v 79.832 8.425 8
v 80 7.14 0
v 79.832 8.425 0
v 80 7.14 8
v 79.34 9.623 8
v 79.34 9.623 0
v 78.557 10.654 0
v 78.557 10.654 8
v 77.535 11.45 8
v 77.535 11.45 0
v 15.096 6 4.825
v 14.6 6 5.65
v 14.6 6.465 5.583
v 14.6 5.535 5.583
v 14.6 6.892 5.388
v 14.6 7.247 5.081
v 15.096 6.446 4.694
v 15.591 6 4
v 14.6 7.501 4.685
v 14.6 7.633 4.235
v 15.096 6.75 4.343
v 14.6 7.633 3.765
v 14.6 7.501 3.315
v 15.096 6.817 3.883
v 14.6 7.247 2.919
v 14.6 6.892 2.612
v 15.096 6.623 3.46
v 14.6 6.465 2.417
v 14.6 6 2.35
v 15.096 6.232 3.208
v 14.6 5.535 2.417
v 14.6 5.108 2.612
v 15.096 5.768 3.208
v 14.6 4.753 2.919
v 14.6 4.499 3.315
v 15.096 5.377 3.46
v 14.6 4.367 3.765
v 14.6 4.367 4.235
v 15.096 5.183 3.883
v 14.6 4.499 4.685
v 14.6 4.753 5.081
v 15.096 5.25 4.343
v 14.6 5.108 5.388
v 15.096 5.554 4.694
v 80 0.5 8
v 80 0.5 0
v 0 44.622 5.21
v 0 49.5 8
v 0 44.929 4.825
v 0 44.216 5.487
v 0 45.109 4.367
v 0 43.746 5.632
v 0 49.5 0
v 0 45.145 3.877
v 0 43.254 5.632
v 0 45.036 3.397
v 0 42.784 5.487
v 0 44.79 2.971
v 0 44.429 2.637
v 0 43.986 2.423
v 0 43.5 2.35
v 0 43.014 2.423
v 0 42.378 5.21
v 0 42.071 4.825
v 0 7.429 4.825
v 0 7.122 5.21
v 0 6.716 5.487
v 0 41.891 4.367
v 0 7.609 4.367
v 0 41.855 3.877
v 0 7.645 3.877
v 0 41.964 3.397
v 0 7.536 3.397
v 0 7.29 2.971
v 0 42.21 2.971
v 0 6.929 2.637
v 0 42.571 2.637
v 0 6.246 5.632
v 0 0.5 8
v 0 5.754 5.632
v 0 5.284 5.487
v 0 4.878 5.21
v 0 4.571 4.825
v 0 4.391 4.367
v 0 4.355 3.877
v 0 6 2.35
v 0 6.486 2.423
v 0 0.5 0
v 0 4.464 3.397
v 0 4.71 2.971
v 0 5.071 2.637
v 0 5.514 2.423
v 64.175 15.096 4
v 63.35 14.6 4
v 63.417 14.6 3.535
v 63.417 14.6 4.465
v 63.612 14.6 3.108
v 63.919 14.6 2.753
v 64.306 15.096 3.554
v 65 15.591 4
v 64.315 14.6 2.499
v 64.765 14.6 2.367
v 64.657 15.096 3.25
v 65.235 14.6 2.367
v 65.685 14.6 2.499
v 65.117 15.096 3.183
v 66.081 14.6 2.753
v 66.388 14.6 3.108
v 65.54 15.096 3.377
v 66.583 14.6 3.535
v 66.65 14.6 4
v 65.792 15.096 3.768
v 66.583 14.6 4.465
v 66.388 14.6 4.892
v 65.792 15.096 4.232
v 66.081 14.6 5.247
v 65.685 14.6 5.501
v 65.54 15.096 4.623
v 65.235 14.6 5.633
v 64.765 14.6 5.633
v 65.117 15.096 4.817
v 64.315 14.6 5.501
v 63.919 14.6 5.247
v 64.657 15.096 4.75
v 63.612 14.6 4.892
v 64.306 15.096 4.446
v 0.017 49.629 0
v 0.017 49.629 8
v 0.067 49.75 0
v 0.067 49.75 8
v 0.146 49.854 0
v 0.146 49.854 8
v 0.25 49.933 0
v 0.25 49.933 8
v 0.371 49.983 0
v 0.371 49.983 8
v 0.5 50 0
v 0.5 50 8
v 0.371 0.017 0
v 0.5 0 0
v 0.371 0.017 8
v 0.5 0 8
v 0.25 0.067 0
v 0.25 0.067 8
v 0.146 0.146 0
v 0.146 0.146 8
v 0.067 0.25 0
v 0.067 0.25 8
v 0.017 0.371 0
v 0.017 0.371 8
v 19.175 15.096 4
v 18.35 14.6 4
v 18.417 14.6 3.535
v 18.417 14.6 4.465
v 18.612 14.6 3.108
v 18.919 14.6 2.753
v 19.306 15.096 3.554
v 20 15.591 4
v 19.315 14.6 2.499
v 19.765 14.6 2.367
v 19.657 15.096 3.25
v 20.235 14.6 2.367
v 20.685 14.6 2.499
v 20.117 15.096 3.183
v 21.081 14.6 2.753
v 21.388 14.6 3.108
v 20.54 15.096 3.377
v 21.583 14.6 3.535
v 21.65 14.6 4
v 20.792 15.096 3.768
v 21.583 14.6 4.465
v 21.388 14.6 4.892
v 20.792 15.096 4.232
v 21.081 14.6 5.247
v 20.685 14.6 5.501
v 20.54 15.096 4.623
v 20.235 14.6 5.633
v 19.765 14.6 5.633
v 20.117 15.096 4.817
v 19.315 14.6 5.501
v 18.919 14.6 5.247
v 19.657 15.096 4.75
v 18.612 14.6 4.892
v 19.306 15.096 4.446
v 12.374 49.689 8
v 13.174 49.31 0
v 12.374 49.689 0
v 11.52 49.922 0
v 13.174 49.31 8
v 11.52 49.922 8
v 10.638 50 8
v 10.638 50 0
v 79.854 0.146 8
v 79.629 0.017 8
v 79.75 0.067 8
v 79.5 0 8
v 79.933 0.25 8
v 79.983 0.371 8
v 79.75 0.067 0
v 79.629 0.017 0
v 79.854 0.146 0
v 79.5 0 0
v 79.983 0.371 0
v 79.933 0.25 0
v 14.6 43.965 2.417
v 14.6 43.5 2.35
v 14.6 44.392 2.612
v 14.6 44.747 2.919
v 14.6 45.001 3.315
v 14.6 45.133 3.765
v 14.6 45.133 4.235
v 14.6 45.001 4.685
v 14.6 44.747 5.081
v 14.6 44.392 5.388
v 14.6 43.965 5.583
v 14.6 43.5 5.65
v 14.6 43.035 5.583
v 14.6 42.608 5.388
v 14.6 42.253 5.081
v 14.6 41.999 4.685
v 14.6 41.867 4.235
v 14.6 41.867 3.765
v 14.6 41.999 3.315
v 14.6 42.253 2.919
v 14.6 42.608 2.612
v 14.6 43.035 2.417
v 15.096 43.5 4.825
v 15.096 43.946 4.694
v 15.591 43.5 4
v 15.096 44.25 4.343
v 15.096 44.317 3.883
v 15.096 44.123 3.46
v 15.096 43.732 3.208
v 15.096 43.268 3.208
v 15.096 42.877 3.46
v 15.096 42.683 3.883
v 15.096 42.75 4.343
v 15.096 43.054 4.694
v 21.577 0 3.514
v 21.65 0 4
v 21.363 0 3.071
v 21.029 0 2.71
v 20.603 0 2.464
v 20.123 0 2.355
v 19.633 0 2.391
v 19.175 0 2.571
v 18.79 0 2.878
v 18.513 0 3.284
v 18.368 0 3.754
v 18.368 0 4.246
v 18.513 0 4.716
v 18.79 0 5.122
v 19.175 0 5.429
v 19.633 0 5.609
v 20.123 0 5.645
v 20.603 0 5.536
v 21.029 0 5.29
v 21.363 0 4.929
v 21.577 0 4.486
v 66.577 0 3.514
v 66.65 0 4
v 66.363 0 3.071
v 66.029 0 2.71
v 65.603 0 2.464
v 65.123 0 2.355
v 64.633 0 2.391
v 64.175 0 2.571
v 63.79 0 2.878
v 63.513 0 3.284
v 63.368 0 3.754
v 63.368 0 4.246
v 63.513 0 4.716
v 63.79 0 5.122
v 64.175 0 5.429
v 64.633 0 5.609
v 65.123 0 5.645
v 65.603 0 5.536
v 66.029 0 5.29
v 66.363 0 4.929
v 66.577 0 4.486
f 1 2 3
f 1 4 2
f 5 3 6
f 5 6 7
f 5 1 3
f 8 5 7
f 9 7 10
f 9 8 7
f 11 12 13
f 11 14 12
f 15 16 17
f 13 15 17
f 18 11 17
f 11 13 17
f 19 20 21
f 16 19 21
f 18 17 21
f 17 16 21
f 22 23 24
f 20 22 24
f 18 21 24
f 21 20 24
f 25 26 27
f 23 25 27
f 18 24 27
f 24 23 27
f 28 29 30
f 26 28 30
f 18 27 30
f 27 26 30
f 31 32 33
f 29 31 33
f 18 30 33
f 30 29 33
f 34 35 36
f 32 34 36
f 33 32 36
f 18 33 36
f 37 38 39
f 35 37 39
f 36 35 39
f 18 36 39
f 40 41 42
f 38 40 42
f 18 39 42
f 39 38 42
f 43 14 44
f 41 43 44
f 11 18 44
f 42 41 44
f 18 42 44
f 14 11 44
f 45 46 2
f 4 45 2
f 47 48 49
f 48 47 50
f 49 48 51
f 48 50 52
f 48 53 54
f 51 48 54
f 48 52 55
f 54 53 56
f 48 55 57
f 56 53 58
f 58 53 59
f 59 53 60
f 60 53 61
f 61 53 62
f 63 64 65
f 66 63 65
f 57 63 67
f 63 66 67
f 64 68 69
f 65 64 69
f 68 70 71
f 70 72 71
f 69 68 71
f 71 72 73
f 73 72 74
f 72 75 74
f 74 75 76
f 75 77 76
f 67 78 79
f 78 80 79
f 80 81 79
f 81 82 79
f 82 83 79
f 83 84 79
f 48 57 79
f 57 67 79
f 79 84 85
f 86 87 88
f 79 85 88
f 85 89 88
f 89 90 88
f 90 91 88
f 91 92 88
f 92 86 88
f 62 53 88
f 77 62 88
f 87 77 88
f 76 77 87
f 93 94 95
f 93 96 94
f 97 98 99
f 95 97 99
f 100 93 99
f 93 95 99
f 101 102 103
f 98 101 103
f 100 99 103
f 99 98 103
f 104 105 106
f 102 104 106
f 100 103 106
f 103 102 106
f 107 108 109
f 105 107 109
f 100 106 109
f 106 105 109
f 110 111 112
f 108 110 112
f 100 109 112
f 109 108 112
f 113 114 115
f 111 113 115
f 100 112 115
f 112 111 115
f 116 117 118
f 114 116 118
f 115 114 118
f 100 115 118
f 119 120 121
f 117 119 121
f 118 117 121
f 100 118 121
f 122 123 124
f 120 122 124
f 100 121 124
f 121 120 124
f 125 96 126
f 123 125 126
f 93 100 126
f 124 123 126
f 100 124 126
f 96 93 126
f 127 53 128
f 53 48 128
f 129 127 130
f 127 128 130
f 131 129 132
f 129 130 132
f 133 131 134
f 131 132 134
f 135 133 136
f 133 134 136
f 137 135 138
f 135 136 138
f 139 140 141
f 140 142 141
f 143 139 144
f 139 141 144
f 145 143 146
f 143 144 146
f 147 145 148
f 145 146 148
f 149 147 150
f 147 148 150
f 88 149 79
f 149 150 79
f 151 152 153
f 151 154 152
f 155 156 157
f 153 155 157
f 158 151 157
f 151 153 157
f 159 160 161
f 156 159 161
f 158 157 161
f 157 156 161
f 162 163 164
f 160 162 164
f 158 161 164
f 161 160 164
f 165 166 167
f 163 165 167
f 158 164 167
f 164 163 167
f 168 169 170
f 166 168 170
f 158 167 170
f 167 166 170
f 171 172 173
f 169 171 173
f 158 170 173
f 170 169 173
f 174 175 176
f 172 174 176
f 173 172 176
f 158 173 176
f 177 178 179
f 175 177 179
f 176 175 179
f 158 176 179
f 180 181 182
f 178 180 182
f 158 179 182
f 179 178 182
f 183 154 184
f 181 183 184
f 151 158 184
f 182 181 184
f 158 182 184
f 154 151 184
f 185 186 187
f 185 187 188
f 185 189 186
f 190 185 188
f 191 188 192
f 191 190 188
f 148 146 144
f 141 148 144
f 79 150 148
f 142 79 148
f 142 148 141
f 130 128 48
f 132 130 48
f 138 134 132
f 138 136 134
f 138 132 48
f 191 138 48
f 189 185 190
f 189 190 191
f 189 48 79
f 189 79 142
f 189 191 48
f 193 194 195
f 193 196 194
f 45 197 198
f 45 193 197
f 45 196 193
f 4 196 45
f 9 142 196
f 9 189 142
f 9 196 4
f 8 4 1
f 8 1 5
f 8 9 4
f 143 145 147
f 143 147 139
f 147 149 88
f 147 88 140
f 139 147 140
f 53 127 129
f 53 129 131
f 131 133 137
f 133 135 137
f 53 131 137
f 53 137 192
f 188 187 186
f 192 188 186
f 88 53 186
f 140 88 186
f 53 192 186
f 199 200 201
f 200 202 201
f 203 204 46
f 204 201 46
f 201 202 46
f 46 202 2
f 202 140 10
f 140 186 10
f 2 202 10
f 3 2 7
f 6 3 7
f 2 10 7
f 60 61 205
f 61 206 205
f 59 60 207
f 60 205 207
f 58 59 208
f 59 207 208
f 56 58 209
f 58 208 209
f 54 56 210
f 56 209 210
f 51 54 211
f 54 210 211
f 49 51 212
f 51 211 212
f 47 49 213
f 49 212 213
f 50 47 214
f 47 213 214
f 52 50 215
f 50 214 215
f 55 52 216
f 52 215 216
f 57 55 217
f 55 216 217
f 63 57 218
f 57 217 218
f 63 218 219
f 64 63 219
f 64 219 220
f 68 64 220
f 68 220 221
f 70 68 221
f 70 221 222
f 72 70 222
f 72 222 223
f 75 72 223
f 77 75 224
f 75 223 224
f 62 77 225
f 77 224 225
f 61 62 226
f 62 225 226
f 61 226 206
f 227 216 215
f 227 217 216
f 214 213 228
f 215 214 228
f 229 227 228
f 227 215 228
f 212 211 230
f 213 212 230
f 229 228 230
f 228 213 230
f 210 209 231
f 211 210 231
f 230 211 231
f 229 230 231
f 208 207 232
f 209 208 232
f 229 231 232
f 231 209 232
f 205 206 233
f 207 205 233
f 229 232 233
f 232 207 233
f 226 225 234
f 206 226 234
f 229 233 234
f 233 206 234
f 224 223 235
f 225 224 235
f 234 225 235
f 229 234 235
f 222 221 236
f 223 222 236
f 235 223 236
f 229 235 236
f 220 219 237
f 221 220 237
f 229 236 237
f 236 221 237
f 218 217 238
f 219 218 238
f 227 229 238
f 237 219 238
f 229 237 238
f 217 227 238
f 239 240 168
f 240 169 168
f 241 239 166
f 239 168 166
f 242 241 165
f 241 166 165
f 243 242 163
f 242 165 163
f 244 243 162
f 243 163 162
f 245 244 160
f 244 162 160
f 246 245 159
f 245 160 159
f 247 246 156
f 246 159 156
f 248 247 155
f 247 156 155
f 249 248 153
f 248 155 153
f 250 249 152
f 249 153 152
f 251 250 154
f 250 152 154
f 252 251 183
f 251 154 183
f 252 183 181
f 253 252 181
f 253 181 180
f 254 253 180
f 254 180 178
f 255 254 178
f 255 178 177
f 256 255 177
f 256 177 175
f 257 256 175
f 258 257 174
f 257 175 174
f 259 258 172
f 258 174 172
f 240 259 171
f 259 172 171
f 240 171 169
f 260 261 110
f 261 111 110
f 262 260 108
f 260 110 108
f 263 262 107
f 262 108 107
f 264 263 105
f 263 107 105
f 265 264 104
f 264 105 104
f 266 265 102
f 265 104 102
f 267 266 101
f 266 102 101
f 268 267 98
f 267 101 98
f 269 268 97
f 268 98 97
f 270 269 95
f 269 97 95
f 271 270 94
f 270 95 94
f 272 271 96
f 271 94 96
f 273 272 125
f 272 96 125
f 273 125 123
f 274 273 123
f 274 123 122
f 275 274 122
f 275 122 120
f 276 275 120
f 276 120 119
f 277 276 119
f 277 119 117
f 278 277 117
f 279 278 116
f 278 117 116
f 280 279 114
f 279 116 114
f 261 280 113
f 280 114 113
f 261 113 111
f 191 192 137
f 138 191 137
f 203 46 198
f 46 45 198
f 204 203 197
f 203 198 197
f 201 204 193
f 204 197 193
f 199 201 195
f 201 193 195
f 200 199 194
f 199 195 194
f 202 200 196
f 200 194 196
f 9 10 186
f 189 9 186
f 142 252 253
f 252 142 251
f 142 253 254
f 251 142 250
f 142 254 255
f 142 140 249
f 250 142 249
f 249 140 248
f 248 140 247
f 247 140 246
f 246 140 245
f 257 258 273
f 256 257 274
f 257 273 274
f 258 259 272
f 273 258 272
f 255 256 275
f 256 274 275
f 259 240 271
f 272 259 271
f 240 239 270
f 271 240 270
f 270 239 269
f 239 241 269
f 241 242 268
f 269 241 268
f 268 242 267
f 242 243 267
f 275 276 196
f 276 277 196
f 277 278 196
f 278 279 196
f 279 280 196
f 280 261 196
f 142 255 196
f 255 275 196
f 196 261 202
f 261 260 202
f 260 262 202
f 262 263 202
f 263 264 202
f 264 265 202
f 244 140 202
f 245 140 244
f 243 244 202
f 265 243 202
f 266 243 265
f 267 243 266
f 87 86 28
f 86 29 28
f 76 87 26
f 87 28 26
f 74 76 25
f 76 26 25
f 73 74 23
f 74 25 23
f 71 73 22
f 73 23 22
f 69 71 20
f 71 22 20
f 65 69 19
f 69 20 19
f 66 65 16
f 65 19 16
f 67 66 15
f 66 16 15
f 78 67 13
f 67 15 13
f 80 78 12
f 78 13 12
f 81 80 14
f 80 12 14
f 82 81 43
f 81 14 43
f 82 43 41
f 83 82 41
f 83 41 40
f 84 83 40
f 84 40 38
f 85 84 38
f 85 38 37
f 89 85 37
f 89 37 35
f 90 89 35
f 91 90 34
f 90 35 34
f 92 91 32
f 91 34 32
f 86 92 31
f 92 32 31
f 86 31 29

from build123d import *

# Parameters (mm, degrees)
BOSS_EXTRUDE1_DEPTH   = 8
FILLET1_R             = 5
FILLET3_R             = 0.5
M4_TAPPED_HOLE1_D     = 3.3
M4_TAPPED_HOLE1_DEPTH = 14.6
M4_TAPPED_HOLE1_TIP   = 0.991420021
M4_TAPPED_HOLE2_D     = 3.3
M4_TAPPED_HOLE2_DEPTH = 14.6
M4_TAPPED_HOLE2_TIP   = 0.991420021


with BuildPart() as part:
    # Sketch1 → Boss-Extrude1 (new body)
    with BuildSketch(Plane.XY):
        Polygon((0, 0), (80, 0), (80, 10), (12, 50), (0, 50), align=None)
    extrude(amount=BOSS_EXTRUDE1_DEPTH)

    # Fillet1
    fillet1_edges = [part.edges().sort_by_distance(p)[0] for p in [
        (12, 50, 4),
        (80, 10, 4),
    ]]
    fillet(fillet1_edges, radius=FILLET1_R)

    # Fillet3
    fillet3_edges = [part.edges().sort_by_distance(p)[0] for p in [
        (0, 50, 4),
        (80, 0, 4),
        (0, 0, 4),
    ]]
    fillet(fillet3_edges, radius=FILLET3_R)

    # M4 Tapped Hole1
    with Locations(Plane.ZY):
        with Locations((4, 43.5), (4, 6)):
            Hole(M4_TAPPED_HOLE1_D / 2, depth=M4_TAPPED_HOLE1_DEPTH)
            with Locations((0, 0, -(M4_TAPPED_HOLE1_DEPTH + M4_TAPPED_HOLE1_TIP / 2))):  # 118° drill point
                Cone(0, M4_TAPPED_HOLE1_D / 2, M4_TAPPED_HOLE1_TIP, mode=Mode.SUBTRACT)

    # M4 Tapped Hole2
    with Locations(Plane(origin=(0, 0, 0), x_dir=(-1, 0, 0), z_dir=(0, -1, 0))):
        with Locations((-20, -4), (-65, -4)):
            Hole(M4_TAPPED_HOLE2_D / 2, depth=M4_TAPPED_HOLE2_DEPTH)
            with Locations((0, 0, -(M4_TAPPED_HOLE2_DEPTH + M4_TAPPED_HOLE2_TIP / 2))):  # 118° drill point
                Cone(0, M4_TAPPED_HOLE2_D / 2, M4_TAPPED_HOLE2_TIP, mode=Mode.SUBTRACT)


solid = part.part
